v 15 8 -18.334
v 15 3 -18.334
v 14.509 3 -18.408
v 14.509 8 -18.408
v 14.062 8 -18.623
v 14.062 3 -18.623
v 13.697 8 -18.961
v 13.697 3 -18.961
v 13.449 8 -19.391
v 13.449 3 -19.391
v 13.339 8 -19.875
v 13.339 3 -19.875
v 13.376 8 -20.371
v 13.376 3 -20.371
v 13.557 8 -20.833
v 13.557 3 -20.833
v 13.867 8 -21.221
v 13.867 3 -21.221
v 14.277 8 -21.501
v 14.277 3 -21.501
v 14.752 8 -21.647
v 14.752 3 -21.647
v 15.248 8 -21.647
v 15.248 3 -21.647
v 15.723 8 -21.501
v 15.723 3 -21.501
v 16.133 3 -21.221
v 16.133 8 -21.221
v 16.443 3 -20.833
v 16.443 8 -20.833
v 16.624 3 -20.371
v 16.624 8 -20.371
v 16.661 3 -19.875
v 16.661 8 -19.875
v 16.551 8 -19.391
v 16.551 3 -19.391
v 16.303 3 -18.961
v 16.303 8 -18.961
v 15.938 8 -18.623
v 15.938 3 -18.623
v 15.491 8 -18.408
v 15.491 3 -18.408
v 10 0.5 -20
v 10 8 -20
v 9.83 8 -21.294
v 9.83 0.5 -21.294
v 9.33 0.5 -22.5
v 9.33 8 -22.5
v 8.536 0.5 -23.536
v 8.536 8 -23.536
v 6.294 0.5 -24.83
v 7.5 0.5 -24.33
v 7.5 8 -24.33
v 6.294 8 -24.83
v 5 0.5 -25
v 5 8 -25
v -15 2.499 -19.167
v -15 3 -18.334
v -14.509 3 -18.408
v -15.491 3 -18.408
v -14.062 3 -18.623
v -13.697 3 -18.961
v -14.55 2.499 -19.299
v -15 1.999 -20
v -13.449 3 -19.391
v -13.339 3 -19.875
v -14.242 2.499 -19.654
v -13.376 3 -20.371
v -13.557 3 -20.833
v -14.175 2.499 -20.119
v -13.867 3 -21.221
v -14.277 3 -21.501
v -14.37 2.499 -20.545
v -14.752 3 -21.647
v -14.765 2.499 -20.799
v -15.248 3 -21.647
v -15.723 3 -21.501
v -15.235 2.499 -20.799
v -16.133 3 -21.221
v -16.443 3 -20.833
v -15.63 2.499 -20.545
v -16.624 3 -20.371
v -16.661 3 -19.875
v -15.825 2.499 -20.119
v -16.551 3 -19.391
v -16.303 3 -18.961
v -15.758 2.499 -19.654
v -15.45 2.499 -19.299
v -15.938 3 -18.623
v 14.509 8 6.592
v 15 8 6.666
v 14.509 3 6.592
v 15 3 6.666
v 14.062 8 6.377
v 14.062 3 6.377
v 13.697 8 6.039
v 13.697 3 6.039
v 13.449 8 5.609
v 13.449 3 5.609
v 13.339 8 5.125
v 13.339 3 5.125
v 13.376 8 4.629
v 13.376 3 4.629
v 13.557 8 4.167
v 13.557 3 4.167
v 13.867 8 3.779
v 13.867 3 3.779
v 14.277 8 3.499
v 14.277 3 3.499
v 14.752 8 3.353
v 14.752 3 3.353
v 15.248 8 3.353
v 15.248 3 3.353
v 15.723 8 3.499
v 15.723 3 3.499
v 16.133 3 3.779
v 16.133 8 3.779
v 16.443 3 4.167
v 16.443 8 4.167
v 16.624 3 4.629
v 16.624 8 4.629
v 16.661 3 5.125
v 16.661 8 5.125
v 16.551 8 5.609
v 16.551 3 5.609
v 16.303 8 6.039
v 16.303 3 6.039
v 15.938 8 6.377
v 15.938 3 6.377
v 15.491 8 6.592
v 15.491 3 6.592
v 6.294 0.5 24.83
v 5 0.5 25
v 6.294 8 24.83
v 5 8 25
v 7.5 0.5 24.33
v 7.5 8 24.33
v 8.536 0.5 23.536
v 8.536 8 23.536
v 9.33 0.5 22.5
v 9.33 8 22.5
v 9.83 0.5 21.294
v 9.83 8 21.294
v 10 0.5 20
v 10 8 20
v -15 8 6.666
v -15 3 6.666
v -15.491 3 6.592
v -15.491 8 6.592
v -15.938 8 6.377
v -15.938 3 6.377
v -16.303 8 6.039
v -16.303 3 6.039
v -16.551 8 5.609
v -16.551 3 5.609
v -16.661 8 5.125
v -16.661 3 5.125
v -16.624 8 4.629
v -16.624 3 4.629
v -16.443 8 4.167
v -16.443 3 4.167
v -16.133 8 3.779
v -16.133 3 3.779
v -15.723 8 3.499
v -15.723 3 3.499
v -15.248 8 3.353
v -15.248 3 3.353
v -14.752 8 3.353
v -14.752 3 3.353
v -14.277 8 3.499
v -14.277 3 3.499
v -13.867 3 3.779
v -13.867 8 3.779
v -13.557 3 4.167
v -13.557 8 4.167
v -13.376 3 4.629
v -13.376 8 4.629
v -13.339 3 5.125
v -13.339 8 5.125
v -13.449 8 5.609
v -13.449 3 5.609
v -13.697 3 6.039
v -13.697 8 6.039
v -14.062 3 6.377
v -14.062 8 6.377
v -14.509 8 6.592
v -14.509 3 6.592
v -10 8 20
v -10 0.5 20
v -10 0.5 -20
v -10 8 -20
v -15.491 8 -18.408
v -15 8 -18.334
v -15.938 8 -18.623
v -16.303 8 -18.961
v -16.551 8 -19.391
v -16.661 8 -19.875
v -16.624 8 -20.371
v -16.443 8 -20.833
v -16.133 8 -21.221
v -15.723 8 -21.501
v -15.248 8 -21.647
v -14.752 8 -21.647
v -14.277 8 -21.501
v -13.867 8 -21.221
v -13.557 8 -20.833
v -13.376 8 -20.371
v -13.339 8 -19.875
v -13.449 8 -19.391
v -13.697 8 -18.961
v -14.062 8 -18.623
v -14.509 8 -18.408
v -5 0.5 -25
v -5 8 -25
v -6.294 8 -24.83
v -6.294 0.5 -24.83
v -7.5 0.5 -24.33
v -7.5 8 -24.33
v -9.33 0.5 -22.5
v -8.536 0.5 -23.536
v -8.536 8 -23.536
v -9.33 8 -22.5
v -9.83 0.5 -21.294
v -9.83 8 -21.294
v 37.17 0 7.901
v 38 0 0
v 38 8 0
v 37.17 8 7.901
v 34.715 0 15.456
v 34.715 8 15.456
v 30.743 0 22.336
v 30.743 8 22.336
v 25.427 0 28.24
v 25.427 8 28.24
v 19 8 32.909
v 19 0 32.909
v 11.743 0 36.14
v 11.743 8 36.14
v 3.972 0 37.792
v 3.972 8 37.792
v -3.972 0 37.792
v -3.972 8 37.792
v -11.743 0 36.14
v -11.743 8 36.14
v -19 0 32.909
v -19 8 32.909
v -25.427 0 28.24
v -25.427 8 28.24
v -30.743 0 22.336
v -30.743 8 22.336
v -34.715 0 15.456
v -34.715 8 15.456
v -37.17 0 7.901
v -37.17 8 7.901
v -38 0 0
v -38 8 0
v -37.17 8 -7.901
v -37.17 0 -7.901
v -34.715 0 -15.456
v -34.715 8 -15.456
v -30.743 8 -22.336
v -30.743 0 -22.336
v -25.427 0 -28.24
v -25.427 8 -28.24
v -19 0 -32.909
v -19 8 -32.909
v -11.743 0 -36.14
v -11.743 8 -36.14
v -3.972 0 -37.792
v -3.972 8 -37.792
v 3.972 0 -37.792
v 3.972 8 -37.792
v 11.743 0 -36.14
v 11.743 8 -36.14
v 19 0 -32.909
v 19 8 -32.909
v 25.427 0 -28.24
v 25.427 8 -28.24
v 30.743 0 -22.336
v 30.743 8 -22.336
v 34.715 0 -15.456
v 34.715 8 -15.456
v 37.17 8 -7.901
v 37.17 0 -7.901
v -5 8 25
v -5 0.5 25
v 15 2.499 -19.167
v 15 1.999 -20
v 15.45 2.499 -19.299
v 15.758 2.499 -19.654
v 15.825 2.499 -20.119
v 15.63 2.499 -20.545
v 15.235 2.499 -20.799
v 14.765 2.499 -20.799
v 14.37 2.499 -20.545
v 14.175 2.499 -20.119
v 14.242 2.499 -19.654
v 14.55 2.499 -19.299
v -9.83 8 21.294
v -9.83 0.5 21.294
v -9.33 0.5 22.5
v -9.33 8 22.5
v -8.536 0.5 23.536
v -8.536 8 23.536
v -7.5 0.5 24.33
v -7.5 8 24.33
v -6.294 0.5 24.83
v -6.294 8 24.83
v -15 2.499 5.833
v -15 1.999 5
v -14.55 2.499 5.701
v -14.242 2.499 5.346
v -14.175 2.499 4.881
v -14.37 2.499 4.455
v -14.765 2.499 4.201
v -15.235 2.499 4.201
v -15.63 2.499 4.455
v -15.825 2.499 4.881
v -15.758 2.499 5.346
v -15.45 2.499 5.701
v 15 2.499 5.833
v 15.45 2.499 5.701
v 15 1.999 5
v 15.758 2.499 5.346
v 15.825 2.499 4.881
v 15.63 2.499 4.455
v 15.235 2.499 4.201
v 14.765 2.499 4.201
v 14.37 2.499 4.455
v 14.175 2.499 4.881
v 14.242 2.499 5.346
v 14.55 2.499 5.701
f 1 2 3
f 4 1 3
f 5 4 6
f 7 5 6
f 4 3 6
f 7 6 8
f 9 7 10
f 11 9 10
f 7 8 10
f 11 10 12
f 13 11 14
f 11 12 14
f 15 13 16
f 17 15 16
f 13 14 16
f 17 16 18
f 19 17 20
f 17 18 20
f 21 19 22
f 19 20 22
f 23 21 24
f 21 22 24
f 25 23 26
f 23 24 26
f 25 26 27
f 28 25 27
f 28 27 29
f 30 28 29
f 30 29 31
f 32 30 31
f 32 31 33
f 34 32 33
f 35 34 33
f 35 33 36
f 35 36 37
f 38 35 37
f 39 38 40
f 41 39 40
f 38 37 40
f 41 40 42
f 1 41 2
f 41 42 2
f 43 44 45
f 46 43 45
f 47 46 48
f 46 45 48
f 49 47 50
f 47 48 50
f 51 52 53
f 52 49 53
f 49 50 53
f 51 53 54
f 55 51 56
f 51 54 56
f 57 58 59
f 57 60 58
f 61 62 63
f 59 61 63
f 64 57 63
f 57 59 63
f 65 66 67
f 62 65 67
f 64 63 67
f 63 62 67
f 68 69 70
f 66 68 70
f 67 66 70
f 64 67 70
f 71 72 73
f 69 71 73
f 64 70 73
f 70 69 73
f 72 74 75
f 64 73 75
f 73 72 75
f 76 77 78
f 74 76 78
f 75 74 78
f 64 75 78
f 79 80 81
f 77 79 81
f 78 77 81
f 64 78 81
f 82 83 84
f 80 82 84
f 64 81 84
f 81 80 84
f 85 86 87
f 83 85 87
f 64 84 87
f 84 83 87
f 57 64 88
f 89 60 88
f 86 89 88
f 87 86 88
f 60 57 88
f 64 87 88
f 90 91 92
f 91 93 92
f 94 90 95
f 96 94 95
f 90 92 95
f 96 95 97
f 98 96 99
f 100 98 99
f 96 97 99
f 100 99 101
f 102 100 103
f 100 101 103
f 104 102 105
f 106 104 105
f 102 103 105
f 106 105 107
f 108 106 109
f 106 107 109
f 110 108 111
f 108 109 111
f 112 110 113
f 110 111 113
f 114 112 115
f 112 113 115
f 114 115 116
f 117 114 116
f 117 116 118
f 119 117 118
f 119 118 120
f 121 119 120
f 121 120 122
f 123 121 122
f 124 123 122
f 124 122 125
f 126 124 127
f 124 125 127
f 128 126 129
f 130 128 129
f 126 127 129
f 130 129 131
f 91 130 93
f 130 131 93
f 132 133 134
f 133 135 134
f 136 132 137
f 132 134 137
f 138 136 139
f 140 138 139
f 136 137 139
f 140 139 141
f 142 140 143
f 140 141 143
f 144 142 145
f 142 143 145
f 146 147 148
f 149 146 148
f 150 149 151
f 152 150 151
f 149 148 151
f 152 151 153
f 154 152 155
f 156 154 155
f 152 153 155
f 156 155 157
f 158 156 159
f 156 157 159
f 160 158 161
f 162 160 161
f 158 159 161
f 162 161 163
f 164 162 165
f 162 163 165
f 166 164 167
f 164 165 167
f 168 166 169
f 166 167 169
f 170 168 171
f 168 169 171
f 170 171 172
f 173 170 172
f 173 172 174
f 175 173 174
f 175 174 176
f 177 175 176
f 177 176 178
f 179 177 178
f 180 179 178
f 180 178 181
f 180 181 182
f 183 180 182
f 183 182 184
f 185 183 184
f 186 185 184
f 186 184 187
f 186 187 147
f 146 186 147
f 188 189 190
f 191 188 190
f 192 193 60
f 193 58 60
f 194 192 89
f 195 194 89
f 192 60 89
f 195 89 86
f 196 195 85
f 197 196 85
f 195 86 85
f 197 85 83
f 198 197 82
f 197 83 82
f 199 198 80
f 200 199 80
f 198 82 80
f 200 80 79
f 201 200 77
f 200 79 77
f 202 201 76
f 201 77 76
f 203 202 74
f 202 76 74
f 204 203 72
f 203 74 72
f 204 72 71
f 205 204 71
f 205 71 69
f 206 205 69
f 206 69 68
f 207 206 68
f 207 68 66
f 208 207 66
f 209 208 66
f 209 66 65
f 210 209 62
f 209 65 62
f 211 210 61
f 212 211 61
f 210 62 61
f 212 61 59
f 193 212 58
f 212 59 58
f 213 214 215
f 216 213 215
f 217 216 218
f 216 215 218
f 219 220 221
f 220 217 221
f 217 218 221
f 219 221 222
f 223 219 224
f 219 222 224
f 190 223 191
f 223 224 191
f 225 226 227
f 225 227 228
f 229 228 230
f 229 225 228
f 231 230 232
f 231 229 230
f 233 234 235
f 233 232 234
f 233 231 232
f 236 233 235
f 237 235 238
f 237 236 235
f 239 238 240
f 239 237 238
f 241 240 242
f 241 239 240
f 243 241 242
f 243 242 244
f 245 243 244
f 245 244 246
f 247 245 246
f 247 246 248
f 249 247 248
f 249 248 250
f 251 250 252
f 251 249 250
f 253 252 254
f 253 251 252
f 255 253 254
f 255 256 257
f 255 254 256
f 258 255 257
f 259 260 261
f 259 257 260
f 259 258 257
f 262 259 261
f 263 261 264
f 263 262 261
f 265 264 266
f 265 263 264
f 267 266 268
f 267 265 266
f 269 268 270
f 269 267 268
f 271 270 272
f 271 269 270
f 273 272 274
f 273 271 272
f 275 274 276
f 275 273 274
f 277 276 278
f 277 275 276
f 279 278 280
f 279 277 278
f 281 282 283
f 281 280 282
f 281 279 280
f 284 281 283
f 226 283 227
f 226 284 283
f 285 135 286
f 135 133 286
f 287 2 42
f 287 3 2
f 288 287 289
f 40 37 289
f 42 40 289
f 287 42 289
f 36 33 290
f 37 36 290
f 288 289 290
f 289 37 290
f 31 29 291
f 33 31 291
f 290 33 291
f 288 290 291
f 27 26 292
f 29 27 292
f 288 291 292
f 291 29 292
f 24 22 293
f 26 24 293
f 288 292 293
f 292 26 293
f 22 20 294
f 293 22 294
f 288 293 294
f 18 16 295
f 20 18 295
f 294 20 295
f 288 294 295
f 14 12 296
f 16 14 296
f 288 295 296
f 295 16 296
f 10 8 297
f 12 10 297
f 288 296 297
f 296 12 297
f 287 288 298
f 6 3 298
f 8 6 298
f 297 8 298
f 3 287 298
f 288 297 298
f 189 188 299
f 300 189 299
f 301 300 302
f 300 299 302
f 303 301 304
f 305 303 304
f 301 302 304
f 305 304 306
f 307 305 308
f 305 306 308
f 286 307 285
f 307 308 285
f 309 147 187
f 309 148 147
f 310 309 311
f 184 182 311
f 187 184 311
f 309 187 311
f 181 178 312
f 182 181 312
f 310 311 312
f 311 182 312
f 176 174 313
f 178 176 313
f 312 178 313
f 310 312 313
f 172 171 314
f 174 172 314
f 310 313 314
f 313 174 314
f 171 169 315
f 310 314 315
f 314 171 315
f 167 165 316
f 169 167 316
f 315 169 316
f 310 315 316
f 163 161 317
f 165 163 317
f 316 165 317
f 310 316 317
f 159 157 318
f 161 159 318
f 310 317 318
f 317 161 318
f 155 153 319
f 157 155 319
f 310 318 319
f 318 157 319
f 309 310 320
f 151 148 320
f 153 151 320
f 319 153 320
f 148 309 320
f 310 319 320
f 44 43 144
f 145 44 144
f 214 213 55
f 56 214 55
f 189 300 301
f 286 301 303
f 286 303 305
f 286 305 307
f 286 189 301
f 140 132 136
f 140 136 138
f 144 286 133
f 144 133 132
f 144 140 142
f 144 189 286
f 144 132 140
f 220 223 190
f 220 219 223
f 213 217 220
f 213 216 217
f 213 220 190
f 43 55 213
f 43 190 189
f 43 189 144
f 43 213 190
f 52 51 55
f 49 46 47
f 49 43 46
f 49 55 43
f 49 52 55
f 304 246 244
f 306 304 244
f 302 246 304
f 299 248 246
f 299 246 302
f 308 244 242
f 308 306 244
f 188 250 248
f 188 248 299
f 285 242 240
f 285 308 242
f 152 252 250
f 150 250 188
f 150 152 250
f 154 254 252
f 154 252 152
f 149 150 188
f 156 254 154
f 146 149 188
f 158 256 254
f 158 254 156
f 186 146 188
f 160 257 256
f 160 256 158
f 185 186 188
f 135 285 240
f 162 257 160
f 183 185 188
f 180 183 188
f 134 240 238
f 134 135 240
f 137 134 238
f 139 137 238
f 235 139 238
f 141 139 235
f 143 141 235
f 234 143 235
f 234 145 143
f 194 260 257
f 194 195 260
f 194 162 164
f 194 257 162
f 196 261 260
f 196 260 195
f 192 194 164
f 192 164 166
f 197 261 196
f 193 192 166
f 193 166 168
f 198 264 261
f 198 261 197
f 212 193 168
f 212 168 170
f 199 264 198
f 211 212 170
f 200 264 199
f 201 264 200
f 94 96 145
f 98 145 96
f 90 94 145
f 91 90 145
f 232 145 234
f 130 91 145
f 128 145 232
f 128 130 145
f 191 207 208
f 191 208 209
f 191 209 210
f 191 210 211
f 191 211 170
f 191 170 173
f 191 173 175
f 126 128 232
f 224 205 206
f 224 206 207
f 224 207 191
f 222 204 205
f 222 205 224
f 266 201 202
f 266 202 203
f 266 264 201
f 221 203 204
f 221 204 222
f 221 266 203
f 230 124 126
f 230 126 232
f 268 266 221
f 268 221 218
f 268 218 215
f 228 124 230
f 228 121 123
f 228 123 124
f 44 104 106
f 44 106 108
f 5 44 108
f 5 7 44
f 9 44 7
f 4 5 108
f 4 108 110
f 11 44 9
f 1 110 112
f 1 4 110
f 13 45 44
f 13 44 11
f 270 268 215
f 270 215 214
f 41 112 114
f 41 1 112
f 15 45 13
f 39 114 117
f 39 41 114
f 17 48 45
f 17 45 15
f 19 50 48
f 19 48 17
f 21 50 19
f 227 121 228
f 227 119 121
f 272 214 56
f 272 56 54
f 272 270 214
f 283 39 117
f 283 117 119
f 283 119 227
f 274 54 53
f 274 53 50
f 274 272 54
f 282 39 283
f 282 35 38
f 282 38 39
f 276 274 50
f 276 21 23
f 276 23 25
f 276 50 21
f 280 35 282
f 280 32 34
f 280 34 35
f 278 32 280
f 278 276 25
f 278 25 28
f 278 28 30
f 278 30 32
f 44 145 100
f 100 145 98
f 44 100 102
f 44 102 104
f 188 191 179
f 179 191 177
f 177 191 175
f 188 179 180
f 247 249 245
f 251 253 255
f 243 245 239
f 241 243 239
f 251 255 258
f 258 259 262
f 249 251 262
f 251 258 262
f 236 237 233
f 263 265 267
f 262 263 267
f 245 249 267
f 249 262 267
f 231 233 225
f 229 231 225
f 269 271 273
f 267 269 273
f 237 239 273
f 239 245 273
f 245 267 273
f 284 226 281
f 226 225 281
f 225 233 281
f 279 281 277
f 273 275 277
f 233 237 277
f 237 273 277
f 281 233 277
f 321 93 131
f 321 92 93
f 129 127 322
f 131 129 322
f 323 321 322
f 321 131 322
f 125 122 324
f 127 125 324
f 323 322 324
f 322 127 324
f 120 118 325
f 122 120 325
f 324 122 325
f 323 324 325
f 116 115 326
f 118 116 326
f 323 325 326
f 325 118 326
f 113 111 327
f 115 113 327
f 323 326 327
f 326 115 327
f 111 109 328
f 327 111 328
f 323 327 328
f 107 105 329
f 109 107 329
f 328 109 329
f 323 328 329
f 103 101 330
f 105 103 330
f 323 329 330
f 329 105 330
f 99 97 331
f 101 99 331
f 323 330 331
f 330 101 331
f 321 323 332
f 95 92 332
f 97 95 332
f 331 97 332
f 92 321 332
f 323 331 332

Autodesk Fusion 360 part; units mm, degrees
sketch "Sketch1" plane through (0, 0, 0) normal (0, 1, 0) x (1, 0, 0)
  circle A0 centre (0, 0) radius 38
  line L0 (-10, 25) -> (10, 25)
  line L1 (10, 25) -> (10, -25)
  line L2 (10, -25) -> (-10, -25)
  line L3 (-10, -25) -> (-10, 25)
  line L4 (1.75, 0) -> (22.5, 0) construction
  line L5 (0, -1.75) -> (0, -22.5) construction
  dimension "d1" = 76
  dimension "d2" = 20
  dimension "d3" = 50
extrude "Extrude1" add sketch "Sketch1" along normal blind 8
extrude "Extrude2" add sketch "Sketch1" along normal blind 0.5 contours L0 L1 L2 L3
sketch "Sketch2" plane through (0, 8, 0) normal (0, 1, 0) x (-1, 0, 0)
  line L0 (-10, 25) -> (10, 25)
  line L1 (10, 25) -> (10, -25)
  line L2 (10, -25) -> (-10, -25)
  line L3 (-10, -25) -> (-10, 25)
  circle A0 centre (0, 0) radius 38
  line L4 (0, 1.75) -> (0, 22.5)
  line L5 (-1.75, 0) -> (-22.5, 0)
  point P0 (15, -20)
  point P1 (15, 5)
  point P2 (-15, -20)
  point P3 (-15, 5)
  dimension "d10" = 30
  dimension "d11" = 25
  dimension "d12" = 20
hole "Hole1" at (-15, 8, -20) at (-15, 8, 5) at (15, 8, -20) at (15, 8, 5) direction (0, -1, 0) diameter 3.332 depth 5 tip angle 118
fillet "Fillet1" radius 5 4 edges at (-10, 4.25, 25) (-10, 4.25, -25) (10, 4.25, 25) (10, 4.25, -25)
equation "d1 = ( 38 * 2 ) * 1 mm"
